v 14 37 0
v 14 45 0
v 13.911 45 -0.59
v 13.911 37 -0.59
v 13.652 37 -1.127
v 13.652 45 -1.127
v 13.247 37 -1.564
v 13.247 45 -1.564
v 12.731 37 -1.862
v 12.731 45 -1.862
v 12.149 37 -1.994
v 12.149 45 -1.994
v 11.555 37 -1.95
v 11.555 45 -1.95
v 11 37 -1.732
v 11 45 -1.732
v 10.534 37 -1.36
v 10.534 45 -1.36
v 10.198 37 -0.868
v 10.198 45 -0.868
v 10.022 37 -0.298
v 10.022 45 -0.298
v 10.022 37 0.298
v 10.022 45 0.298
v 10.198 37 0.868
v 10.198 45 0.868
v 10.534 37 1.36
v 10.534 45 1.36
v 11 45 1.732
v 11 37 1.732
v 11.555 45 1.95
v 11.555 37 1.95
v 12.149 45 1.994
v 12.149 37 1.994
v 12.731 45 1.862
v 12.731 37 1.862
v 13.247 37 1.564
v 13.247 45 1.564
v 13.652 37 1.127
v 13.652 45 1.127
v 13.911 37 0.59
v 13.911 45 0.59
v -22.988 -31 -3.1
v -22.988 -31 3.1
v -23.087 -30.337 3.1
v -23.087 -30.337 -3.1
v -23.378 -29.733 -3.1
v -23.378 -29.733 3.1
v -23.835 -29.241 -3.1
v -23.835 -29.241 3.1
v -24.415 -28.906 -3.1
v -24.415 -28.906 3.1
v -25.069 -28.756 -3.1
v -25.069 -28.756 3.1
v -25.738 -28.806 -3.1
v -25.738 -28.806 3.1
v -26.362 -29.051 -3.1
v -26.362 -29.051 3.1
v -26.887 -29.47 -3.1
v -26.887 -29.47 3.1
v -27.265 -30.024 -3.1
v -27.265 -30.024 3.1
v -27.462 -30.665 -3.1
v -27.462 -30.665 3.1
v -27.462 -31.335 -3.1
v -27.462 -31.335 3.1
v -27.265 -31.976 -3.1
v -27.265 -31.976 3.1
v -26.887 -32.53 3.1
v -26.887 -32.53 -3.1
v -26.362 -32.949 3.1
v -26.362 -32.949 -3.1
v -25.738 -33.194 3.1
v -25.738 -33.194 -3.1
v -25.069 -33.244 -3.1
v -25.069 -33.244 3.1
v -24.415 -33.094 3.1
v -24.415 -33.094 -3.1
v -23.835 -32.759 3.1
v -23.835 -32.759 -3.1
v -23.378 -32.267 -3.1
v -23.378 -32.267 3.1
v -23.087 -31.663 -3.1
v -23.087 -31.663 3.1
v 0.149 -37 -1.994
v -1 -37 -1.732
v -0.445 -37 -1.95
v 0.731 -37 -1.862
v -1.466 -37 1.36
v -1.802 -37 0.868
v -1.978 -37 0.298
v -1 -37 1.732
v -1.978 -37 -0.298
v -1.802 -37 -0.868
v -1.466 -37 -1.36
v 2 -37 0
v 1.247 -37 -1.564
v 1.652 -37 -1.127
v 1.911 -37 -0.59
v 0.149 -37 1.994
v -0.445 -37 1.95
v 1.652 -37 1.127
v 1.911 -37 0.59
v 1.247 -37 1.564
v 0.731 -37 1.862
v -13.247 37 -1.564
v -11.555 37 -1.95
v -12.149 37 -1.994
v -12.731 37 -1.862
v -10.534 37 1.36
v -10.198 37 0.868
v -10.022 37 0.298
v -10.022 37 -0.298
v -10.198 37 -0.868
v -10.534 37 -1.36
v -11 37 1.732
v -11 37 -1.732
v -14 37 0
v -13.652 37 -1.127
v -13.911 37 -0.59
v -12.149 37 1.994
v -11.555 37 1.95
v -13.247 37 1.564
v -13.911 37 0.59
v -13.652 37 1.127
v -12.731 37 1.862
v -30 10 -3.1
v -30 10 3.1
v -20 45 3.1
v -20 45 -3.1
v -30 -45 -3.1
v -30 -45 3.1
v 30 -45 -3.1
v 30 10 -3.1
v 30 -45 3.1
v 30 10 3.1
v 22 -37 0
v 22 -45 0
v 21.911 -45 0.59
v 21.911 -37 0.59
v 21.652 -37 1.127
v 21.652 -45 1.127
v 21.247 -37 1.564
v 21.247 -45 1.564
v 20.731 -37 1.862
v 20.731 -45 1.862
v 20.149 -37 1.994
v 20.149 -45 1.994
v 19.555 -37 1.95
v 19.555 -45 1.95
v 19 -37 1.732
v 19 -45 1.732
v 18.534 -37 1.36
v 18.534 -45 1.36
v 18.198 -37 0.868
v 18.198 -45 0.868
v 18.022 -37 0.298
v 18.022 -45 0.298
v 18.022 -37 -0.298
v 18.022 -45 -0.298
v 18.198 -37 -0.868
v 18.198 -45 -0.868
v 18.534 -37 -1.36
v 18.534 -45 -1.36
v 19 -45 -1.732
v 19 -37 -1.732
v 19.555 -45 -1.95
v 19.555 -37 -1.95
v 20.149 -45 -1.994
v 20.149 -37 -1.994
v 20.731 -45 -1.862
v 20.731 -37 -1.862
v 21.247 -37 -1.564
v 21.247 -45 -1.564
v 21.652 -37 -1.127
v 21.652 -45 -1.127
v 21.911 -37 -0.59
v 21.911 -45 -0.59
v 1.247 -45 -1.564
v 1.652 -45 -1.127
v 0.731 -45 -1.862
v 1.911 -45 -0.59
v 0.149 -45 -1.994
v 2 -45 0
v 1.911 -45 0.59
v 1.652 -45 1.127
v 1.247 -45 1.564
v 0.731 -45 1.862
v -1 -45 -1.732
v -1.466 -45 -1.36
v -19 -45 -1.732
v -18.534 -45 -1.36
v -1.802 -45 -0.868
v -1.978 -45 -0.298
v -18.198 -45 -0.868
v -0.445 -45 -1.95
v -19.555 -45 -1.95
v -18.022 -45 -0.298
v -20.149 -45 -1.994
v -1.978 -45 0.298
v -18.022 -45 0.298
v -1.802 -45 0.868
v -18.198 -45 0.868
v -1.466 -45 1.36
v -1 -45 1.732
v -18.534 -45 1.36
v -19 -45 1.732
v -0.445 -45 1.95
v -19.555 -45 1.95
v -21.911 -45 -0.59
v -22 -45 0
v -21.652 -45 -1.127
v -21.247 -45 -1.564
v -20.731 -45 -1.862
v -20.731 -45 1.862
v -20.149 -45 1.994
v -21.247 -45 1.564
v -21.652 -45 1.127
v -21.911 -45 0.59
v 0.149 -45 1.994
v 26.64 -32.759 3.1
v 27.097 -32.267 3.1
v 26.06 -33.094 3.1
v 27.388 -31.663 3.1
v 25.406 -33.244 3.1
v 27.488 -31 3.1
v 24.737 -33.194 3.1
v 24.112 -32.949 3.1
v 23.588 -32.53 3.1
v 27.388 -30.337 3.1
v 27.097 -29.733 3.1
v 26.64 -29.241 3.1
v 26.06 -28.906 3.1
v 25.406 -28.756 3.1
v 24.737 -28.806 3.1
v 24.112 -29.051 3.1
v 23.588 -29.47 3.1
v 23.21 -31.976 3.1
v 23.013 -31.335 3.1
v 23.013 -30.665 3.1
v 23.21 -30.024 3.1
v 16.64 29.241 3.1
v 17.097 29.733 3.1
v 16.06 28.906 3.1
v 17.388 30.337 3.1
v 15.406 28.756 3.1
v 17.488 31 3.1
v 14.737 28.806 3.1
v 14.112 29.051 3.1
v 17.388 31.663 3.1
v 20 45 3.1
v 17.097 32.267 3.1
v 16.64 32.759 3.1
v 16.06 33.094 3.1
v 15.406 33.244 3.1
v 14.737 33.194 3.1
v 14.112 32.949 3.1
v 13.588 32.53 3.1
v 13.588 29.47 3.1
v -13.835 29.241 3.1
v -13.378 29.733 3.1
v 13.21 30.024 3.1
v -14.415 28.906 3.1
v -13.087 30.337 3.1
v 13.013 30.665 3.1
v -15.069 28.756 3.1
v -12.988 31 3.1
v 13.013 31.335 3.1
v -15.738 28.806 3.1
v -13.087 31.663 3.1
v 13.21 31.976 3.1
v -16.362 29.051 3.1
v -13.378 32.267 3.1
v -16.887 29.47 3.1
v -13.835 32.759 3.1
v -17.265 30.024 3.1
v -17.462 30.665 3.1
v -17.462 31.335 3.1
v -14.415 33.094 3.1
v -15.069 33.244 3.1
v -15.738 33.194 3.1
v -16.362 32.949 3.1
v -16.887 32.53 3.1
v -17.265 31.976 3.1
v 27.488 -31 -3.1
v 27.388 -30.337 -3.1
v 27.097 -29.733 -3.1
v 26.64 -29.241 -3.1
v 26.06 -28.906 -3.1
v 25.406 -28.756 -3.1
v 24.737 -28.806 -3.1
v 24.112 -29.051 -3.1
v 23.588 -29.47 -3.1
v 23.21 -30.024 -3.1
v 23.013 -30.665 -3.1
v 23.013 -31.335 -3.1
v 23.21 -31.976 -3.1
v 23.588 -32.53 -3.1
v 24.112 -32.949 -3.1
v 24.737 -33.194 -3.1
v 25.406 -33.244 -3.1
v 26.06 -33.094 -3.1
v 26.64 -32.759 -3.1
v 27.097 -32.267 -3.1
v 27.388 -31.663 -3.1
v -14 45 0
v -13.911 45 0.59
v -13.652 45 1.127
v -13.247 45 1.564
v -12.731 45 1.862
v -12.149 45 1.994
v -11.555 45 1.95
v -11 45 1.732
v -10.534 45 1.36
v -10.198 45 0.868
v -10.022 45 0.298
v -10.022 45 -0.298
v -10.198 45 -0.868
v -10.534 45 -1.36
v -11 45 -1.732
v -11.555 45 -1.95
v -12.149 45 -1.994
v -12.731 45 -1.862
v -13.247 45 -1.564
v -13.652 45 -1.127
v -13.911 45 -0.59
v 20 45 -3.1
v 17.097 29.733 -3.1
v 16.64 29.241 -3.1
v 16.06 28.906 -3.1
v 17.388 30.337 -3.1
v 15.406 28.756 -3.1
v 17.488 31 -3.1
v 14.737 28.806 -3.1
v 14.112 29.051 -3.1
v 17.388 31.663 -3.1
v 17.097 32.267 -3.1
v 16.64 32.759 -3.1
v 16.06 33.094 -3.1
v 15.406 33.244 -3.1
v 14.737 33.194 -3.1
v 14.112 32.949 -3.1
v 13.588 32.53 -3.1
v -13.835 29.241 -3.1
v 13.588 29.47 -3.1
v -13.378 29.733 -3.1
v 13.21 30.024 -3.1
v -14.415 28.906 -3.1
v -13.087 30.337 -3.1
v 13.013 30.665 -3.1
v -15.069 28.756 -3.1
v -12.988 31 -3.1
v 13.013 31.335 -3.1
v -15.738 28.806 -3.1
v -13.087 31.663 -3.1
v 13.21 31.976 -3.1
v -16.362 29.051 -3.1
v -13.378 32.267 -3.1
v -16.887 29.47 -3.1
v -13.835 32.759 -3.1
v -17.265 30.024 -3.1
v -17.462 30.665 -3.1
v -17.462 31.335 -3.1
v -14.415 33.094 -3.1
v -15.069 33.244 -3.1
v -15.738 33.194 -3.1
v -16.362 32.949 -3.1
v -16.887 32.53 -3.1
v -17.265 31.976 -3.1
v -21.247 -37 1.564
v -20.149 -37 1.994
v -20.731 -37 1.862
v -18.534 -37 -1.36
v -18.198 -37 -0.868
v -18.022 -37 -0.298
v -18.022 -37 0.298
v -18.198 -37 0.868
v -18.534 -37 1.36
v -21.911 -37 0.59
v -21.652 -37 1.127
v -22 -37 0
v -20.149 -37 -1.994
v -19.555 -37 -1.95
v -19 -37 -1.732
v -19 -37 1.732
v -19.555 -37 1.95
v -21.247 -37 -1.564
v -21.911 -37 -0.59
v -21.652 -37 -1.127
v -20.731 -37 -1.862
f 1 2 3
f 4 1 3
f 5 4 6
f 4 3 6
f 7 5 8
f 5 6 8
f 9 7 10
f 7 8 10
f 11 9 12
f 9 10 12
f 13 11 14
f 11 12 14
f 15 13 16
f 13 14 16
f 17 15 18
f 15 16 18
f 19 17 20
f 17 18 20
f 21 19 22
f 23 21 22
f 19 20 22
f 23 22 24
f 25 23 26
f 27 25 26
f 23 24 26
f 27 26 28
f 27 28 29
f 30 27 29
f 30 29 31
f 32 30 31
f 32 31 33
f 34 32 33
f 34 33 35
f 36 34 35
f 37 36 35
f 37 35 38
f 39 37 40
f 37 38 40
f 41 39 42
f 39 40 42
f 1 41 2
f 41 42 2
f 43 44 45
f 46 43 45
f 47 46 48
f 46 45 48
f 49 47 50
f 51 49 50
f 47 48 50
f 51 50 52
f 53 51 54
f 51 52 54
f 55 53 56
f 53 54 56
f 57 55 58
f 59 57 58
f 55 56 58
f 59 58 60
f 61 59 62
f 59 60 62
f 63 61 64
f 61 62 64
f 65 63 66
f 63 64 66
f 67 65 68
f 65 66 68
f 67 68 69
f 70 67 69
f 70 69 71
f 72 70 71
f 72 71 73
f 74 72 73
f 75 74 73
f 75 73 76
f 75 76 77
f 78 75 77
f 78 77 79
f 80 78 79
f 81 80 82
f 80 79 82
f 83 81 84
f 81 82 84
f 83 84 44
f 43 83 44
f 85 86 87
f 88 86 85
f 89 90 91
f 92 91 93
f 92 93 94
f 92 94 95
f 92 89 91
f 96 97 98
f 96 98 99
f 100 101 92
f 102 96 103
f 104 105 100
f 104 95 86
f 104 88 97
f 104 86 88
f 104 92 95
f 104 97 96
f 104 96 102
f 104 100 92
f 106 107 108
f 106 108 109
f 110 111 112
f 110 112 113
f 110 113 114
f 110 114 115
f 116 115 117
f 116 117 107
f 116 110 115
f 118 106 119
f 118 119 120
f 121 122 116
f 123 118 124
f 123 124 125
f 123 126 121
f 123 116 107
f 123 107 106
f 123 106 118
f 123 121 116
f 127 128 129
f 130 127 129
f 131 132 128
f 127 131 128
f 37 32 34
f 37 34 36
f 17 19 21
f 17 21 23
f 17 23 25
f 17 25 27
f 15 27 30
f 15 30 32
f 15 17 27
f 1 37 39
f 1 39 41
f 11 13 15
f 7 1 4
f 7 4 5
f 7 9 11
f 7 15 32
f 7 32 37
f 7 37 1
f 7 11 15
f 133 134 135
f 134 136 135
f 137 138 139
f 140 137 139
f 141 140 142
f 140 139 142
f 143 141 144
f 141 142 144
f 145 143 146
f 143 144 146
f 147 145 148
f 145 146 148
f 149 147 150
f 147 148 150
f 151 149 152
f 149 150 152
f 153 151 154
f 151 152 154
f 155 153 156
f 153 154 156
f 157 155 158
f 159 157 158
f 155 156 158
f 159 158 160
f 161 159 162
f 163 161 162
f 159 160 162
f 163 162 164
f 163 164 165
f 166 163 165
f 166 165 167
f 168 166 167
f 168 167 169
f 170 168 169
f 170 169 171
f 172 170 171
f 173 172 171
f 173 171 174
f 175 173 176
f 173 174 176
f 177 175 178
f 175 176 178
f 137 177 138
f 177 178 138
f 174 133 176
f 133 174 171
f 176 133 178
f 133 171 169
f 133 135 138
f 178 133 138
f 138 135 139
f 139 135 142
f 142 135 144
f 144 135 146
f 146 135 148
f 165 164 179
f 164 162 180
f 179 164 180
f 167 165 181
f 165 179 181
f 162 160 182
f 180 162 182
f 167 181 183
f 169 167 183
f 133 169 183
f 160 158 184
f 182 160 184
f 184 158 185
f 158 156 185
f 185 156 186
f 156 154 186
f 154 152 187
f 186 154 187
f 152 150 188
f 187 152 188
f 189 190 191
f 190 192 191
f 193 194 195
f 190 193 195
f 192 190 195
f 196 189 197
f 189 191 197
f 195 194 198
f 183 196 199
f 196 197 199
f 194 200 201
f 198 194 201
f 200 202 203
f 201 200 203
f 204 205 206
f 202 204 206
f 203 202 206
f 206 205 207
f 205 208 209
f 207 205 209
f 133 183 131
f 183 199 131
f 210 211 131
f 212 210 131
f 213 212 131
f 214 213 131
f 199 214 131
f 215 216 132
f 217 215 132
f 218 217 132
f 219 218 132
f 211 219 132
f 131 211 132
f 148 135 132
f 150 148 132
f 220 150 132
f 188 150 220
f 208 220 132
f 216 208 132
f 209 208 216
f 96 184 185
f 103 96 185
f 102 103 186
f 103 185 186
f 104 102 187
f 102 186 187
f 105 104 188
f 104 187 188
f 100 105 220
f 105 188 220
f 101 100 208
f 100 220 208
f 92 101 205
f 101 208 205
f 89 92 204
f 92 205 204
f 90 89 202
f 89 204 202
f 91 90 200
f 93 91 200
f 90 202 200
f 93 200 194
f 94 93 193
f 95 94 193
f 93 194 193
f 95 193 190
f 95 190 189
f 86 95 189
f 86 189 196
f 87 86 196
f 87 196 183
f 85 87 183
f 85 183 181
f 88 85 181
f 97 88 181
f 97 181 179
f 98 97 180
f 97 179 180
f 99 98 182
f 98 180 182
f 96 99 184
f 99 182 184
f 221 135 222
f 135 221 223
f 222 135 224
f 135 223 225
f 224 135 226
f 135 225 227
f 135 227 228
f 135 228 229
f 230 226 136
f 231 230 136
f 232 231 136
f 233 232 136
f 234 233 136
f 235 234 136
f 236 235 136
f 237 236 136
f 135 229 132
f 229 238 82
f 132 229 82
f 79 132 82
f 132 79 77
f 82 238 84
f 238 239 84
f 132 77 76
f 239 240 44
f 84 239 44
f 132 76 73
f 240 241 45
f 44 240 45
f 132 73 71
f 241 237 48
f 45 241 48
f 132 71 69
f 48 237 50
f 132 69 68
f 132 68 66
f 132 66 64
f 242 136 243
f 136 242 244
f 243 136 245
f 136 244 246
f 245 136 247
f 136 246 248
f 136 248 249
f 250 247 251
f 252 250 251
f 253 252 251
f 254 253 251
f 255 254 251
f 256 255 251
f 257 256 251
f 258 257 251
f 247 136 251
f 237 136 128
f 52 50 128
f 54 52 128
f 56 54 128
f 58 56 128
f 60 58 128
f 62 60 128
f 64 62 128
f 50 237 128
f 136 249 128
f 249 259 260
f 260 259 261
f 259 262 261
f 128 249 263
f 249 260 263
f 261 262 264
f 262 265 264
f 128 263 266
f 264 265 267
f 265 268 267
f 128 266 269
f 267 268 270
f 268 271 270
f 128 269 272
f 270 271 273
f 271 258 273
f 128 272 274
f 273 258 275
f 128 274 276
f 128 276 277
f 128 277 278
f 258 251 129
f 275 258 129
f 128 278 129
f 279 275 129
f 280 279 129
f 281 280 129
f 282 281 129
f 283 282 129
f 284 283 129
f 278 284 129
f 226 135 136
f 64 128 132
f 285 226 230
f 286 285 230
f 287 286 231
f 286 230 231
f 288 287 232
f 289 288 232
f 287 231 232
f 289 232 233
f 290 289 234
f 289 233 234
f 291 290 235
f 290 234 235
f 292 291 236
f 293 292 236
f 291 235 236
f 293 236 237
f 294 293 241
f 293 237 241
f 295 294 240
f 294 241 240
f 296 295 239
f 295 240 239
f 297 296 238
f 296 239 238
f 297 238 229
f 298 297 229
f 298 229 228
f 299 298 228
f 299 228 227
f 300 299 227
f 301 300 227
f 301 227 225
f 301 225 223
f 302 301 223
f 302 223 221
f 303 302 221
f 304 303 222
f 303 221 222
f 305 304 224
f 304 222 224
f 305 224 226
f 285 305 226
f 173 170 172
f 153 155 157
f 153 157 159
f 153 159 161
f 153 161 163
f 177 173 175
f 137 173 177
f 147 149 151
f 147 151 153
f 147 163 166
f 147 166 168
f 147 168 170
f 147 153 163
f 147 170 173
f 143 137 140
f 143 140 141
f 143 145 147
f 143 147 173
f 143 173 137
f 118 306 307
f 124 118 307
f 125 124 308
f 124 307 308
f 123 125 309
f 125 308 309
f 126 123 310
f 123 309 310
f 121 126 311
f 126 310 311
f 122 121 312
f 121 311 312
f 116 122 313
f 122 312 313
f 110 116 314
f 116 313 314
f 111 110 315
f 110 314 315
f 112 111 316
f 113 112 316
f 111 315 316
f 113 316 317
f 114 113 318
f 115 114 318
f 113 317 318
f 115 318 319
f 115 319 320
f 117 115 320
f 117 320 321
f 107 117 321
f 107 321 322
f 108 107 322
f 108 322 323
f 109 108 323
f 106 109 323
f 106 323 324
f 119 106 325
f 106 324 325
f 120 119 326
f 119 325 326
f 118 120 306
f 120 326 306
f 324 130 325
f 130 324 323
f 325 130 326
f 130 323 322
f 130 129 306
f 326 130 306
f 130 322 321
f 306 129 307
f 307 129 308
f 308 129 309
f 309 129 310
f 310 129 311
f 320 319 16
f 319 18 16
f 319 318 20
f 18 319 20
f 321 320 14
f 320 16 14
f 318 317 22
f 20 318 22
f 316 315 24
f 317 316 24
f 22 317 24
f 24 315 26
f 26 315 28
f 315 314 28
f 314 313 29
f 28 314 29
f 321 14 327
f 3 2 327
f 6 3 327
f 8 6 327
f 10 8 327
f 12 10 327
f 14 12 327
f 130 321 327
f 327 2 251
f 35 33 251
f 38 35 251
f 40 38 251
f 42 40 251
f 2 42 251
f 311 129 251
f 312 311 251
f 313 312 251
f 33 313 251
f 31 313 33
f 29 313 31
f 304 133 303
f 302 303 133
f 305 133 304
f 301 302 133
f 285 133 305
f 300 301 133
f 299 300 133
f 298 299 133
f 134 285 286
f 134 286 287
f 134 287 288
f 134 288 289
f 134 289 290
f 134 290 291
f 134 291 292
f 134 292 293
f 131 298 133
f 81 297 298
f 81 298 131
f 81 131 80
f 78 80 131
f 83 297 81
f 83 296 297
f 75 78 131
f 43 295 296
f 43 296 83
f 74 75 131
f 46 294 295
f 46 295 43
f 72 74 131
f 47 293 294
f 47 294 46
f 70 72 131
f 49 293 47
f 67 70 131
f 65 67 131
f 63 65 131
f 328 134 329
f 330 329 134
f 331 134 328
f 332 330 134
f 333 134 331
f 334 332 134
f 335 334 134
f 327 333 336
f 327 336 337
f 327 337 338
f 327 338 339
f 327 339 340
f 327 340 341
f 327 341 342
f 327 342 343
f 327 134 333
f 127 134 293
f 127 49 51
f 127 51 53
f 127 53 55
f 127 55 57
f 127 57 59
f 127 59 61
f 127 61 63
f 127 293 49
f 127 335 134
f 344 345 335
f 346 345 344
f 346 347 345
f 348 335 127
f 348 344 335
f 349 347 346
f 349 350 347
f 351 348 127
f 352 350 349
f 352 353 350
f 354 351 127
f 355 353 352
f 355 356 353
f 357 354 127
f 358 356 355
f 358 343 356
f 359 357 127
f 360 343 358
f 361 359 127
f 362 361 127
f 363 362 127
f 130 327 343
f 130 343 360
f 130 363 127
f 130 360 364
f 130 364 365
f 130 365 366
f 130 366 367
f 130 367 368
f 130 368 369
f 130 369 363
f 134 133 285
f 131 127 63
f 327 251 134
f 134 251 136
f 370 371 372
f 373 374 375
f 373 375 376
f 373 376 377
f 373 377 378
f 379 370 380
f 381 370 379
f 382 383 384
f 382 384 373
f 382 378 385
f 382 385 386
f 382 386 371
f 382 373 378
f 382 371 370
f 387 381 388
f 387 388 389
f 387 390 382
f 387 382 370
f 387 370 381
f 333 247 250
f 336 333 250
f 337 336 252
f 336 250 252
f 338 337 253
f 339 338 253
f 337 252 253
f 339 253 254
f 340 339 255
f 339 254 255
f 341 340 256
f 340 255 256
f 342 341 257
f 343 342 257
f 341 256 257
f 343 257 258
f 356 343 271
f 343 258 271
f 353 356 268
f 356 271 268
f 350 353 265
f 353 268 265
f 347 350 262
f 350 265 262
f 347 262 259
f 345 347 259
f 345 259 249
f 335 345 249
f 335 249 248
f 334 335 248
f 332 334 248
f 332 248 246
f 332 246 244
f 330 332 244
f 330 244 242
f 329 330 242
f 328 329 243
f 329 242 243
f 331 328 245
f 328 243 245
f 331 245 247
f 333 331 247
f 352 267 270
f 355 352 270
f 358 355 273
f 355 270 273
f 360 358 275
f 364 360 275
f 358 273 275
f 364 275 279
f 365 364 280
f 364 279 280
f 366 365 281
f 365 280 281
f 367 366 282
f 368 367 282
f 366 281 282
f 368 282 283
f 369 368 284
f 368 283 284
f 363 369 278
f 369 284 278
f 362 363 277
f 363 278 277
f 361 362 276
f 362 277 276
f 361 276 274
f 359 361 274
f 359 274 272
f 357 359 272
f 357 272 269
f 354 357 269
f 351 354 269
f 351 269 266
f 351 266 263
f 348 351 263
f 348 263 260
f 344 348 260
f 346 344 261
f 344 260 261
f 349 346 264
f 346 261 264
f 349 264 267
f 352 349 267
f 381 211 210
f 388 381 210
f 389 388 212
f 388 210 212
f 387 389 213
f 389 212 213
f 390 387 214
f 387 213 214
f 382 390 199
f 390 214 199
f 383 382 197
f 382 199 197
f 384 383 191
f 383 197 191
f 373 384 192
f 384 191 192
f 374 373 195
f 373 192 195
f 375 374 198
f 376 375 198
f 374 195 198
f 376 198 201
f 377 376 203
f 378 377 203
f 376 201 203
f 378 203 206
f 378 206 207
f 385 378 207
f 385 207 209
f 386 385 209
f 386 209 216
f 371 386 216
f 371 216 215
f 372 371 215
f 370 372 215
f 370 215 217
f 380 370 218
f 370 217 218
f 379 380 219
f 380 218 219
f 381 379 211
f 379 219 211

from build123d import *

# Parameters (mm, degrees)
EXTRUDE_1_4_DEPTH = 3.1
SKETCH4_R         = 2
M4_DRILL_DEPTH    = 8
SKETCH5_R         = 2
M4_DRILL2_DEPTH   = 8
SKETCH6_R         = 2.25
M4_THROUGH_DEPTH  = 6.2


with BuildPart() as part:
    # Sketch1 → 1/4 (new, symmetric)
    with BuildSketch(Plane.XY):
        Polygon((-20, 45), (20, 45), (30, 10), (30, -45), (-30, -45), (-30, 10), align=None)
    extrude(amount=EXTRUDE_1_4_DEPTH, both=True)

    # Sketch4 → M4_DRILL (cut)
    with BuildSketch(Plane(origin=(0, 45, 0), x_dir=(1, 0, 0), z_dir=(0, 1, 0))):
        with Locations(Location((-12, 0, 0), (0, 0, 180))):
            Circle(SKETCH4_R)
        with Locations((12, 0)):
            Circle(SKETCH4_R)
    extrude(amount=-M4_DRILL_DEPTH, mode=Mode.SUBTRACT)

    # Sketch5 → M4_DRILL2 (cut)
    with BuildSketch(Plane(origin=(0, -45, 0), x_dir=(-1, 0, 0), z_dir=(0, -1, 0))):
        with Locations(Location((-20, 0, 0), (0, 0, 180))):
            Circle(SKETCH5_R)
        with Locations((20, 0)):
            Circle(SKETCH5_R)
        with Locations(Location((0, 0, 0), (0, 0, 180))):
            Circle(SKETCH5_R)
    extrude(amount=-M4_DRILL2_DEPTH, mode=Mode.SUBTRACT)

    # Sketch6 → M4_through (cut)
    with BuildSketch(Plane.XY.offset(3.1)):
        with Locations((-25.2375, -31)):
            Circle(SKETCH6_R)
        with Locations((25.2375, -31)):
            Circle(SKETCH6_R)
        with Locations((-15.2375, 31)):
            Circle(SKETCH6_R)
        with Locations((15.2375, 31)):
            Circle(SKETCH6_R)
    extrude(amount=-M4_THROUGH_DEPTH, mode=Mode.SUBTRACT)


solid = part.part
